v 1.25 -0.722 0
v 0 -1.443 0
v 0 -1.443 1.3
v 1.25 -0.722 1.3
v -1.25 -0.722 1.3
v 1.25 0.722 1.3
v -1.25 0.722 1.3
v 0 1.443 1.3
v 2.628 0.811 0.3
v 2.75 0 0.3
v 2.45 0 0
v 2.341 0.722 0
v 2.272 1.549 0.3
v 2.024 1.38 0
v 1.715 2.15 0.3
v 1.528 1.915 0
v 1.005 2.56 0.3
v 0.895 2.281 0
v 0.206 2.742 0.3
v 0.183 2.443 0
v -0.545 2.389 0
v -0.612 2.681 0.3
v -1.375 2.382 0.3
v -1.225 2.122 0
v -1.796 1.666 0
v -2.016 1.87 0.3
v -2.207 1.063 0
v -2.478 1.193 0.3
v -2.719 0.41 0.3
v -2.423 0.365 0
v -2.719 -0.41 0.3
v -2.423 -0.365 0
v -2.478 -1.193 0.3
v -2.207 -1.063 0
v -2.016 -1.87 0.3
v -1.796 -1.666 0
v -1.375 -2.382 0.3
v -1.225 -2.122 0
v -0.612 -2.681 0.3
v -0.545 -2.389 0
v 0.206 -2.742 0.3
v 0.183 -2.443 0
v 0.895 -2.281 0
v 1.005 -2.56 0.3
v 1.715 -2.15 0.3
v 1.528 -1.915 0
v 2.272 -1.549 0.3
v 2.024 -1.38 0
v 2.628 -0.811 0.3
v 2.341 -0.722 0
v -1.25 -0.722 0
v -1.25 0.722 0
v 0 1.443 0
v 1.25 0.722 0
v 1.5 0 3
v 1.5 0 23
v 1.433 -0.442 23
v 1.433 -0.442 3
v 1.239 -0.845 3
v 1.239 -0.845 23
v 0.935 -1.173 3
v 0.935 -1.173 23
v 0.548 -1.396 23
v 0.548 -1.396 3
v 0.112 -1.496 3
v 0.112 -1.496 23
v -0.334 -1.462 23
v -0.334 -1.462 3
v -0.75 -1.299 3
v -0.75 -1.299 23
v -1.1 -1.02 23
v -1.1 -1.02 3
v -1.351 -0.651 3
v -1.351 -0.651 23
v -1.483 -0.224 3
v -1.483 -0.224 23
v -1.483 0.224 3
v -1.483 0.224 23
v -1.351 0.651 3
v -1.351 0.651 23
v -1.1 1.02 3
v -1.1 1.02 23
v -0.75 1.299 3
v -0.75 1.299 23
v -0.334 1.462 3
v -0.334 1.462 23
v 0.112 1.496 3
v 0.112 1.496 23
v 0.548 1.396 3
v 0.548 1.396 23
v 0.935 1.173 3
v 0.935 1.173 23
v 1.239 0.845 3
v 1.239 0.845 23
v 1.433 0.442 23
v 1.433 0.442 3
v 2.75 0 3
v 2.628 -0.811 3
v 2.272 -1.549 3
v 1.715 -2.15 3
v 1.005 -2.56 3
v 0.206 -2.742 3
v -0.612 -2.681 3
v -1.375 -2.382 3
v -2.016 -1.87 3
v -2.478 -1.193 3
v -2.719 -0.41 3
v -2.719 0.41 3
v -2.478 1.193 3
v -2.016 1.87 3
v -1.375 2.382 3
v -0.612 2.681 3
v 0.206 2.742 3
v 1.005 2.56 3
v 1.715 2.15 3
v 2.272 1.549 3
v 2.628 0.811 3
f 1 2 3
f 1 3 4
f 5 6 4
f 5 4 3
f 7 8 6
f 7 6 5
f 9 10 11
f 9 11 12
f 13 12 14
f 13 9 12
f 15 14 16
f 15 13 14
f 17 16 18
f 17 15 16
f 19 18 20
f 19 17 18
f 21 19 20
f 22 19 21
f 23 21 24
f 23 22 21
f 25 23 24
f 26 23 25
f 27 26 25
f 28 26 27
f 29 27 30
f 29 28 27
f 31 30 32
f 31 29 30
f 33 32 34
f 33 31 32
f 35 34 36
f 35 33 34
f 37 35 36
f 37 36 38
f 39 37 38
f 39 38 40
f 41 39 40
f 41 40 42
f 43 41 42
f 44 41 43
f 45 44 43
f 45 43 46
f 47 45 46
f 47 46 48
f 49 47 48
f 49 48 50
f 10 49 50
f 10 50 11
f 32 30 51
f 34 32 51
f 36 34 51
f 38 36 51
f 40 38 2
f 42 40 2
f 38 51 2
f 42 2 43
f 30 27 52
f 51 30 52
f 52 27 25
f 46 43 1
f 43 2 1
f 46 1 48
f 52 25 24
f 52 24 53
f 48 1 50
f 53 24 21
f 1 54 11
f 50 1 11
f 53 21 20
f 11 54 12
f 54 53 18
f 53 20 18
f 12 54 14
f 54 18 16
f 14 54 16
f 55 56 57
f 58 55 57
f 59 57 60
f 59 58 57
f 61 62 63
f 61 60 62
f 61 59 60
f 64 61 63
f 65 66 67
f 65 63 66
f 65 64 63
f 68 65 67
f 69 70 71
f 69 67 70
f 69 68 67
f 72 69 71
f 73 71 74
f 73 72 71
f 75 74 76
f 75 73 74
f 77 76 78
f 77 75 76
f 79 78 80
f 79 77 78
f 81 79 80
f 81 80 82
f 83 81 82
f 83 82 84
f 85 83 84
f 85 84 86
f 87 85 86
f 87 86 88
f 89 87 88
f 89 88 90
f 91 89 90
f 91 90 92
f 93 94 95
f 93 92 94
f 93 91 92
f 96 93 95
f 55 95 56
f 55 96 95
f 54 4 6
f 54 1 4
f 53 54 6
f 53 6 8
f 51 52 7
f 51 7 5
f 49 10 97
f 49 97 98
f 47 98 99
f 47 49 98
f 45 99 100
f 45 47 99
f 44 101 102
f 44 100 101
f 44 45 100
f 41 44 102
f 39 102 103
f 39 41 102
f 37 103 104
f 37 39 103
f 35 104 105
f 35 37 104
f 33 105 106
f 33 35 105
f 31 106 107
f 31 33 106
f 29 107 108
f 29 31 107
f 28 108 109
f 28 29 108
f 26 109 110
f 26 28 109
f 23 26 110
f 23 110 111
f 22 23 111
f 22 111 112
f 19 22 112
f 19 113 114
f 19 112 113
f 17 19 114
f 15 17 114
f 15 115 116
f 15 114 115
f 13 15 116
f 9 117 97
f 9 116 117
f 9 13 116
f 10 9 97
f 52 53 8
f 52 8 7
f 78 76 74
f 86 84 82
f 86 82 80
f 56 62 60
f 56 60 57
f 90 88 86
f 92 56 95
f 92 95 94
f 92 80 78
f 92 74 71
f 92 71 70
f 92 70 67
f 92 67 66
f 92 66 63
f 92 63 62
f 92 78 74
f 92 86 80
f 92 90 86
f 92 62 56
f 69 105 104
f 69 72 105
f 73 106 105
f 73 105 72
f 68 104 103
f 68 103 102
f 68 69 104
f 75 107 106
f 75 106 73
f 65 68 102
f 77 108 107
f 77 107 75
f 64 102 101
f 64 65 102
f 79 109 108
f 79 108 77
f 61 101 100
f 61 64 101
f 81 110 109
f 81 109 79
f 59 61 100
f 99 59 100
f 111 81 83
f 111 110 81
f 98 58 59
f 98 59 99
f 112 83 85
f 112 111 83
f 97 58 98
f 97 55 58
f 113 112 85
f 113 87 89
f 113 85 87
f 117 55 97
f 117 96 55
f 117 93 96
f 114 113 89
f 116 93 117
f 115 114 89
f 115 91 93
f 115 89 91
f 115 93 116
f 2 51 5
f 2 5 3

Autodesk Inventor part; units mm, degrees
ref_plane "YZ Plane" through (0, 0, 0) normal (1, 0, 0) x (0, 1, 0)
ref_plane "XZ Plane" through (0, 0, 0) normal (0, 1, 0) x (-1, 0, 0)
ref_plane "XY Plane" through (0, 0, 0) normal (0, 0, 1) x (1, 0, 0)
sketch "スケッチ1" plane through (0, 0, 0) normal (0, 0, 1) x (1, 0, 0)
  circle A0 centre (0, 0) radius 2.75
  circle A1 centre (0, 0) radius 1.5
  dimension "d0" = 5.5
  dimension "d1" = 3
extrude "押し出し1" add sketch "スケッチ1" along normal blind 3
extrude "押し出し2" add sketch "スケッチ1" along normal blind 23 contours A1
chamfer "面取り1" distance 0.3 angle 45 1 edges at (-2.75, 0, 0)
sketch "スケッチ2" plane through (0, 0, 0) normal (0, 0, -1) x (-1, 0, 0)
  line L0 (0, -1.4434) -> (-1.25, -0.7217)
  line L1 (-1.25, -0.7217) -> (-1.25, 0.7217)
  line L2 (-1.25, 0.7217) -> (0, 1.4434)
  line L3 (0, 1.4434) -> (1.25, 0.7217)
  line L4 (1.25, 0.7217) -> (1.25, -0.7217)
  line L5 (1.25, -0.7217) -> (0, -1.4434)
  point P0 (0, 0)
  point P1 (0, 0)
  dimension "d9" = 2.5
extrude "押し出し3" cut sketch "スケッチ2" against normal blind 1.3
thread "ねじ1" size "M3x0.5" class "6g" standard "ANSI Metric M Profile" full length
properties part number "キャップボルトM3×20" material "鋼"
